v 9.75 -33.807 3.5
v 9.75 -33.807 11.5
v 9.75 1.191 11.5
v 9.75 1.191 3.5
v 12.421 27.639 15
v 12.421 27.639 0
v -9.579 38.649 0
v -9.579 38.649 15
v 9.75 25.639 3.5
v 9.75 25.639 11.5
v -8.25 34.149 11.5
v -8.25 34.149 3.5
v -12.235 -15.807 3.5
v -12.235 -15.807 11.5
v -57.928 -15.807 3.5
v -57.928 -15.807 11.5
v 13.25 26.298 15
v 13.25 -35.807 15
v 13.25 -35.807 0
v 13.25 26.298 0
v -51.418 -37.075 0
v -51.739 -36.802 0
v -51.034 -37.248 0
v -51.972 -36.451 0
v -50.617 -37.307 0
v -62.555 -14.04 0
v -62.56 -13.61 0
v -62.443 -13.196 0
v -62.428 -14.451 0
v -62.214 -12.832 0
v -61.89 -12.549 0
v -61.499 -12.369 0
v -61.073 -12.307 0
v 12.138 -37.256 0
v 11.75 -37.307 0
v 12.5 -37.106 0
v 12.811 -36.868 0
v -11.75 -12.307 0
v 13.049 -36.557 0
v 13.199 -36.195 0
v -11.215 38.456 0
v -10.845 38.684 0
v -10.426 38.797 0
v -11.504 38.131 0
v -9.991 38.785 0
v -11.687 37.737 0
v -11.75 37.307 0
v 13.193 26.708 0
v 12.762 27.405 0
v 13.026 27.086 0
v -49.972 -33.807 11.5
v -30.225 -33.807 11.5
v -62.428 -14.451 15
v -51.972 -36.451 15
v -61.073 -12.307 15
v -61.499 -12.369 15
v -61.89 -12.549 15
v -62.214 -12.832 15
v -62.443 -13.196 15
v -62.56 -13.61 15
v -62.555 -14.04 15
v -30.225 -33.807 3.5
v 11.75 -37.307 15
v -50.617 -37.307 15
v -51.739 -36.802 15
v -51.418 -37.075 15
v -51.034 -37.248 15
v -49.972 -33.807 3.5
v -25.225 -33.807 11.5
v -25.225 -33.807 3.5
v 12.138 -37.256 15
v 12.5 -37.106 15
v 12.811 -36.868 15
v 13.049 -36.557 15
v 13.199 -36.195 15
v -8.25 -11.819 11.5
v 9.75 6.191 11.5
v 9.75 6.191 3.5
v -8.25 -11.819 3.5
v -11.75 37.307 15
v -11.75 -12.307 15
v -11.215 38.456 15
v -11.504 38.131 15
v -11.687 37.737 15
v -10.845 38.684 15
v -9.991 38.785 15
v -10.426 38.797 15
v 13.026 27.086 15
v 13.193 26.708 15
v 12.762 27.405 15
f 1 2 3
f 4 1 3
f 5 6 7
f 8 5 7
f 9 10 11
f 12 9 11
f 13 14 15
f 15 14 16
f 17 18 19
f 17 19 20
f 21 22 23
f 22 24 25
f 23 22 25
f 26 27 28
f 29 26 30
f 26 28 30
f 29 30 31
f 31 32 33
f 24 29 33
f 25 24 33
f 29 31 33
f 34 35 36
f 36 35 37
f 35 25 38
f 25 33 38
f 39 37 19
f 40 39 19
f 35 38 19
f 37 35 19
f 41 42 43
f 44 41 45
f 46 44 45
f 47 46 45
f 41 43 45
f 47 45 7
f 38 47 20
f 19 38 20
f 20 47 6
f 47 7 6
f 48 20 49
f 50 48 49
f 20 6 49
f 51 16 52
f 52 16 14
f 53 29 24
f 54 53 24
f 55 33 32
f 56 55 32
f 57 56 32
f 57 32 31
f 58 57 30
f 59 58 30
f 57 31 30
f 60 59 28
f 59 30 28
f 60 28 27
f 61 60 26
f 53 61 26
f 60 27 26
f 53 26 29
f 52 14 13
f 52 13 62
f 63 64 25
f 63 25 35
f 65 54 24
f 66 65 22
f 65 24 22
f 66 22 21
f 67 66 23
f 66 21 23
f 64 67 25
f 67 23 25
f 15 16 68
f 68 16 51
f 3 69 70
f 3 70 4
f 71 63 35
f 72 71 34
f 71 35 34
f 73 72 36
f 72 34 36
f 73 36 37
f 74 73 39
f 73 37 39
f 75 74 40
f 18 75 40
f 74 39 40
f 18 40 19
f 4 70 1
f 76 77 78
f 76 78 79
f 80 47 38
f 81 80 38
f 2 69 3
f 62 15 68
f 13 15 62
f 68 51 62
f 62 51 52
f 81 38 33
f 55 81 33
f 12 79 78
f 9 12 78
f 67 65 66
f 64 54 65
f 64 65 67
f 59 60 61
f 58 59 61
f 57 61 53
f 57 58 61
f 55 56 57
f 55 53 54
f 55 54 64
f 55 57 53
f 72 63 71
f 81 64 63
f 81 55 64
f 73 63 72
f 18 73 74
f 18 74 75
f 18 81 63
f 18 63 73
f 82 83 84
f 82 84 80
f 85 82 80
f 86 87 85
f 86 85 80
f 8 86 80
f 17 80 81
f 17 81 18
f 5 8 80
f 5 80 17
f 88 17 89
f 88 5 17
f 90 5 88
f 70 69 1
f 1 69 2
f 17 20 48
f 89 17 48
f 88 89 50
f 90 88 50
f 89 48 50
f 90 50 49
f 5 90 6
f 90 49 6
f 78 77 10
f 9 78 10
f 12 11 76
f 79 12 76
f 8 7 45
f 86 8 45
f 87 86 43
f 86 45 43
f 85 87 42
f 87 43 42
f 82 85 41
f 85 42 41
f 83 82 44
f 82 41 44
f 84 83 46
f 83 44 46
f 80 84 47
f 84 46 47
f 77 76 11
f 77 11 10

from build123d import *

# Parameters (mm, degrees)
PAD_DEPTH    = 15
POCKET_DEPTH = 8
PAD001_DEPTH = 15


with BuildPart() as part:
    # Sketch → Pad (new body)
    with BuildSketch(Plane.XY):
        with BuildLine():
            Line((-50.61699, -37.307126), (11.75, -37.307126))
            ThreePointArc((11.75, -37.307126), (12.81066, -36.867787), (13.25, -35.807126))
            Line((13.25, -35.807126), (13.25, 26.297858))
            ThreePointArc((13.25, 26.297858), (13.026109, 27.08624), (12.421272, 27.639273))
            Line((12.421272, 27.639273), (-9.578728, 38.648541))
            ThreePointArc((-9.578728, 38.648541), (-11.038382, 38.583235), (-11.75, 37.307126))
            Line((-11.75, 37.307126), (-11.75, -12.307126))
            Line((-11.75, -12.307126), (-61.073474, -12.307126))
            ThreePointArc((-61.073474, -12.307126), (-62.341517, -13.005836), (-62.428236, -14.451037))
            Line((-62.428236, -14.451037), (-51.971751, -36.451037))
            ThreePointArc((-51.971751, -36.451037), (-51.418281, -37.075169), (-50.61699, -37.307126))
        make_face()
    extrude(amount=PAD_DEPTH)

    # Sketch001 (on DatumPlane) → Pocket (cut)
    with BuildSketch(Plane.XY.offset(11.5)):
        Polygon((-8.25, -15.807126), (-57.928236, -15.807126), (-49.971751, -33.807126), (9.75, -33.807126), (9.75, 25.639273), (-8.25, 34.148541), align=None)
    extrude(amount=-POCKET_DEPTH, mode=Mode.SUBTRACT)

    # Sketch002 (on Face5 of Pocket) → Pad001 (join)
    with BuildSketch(Plane.XY.offset(15)):
        Polygon((-33.723206, -37.307126), (-28.723206, -37.307126), (13.25, 4.692874), (13.25, 9.692874), align=None)
    extrude(amount=-PAD001_DEPTH)


solid = part.part
